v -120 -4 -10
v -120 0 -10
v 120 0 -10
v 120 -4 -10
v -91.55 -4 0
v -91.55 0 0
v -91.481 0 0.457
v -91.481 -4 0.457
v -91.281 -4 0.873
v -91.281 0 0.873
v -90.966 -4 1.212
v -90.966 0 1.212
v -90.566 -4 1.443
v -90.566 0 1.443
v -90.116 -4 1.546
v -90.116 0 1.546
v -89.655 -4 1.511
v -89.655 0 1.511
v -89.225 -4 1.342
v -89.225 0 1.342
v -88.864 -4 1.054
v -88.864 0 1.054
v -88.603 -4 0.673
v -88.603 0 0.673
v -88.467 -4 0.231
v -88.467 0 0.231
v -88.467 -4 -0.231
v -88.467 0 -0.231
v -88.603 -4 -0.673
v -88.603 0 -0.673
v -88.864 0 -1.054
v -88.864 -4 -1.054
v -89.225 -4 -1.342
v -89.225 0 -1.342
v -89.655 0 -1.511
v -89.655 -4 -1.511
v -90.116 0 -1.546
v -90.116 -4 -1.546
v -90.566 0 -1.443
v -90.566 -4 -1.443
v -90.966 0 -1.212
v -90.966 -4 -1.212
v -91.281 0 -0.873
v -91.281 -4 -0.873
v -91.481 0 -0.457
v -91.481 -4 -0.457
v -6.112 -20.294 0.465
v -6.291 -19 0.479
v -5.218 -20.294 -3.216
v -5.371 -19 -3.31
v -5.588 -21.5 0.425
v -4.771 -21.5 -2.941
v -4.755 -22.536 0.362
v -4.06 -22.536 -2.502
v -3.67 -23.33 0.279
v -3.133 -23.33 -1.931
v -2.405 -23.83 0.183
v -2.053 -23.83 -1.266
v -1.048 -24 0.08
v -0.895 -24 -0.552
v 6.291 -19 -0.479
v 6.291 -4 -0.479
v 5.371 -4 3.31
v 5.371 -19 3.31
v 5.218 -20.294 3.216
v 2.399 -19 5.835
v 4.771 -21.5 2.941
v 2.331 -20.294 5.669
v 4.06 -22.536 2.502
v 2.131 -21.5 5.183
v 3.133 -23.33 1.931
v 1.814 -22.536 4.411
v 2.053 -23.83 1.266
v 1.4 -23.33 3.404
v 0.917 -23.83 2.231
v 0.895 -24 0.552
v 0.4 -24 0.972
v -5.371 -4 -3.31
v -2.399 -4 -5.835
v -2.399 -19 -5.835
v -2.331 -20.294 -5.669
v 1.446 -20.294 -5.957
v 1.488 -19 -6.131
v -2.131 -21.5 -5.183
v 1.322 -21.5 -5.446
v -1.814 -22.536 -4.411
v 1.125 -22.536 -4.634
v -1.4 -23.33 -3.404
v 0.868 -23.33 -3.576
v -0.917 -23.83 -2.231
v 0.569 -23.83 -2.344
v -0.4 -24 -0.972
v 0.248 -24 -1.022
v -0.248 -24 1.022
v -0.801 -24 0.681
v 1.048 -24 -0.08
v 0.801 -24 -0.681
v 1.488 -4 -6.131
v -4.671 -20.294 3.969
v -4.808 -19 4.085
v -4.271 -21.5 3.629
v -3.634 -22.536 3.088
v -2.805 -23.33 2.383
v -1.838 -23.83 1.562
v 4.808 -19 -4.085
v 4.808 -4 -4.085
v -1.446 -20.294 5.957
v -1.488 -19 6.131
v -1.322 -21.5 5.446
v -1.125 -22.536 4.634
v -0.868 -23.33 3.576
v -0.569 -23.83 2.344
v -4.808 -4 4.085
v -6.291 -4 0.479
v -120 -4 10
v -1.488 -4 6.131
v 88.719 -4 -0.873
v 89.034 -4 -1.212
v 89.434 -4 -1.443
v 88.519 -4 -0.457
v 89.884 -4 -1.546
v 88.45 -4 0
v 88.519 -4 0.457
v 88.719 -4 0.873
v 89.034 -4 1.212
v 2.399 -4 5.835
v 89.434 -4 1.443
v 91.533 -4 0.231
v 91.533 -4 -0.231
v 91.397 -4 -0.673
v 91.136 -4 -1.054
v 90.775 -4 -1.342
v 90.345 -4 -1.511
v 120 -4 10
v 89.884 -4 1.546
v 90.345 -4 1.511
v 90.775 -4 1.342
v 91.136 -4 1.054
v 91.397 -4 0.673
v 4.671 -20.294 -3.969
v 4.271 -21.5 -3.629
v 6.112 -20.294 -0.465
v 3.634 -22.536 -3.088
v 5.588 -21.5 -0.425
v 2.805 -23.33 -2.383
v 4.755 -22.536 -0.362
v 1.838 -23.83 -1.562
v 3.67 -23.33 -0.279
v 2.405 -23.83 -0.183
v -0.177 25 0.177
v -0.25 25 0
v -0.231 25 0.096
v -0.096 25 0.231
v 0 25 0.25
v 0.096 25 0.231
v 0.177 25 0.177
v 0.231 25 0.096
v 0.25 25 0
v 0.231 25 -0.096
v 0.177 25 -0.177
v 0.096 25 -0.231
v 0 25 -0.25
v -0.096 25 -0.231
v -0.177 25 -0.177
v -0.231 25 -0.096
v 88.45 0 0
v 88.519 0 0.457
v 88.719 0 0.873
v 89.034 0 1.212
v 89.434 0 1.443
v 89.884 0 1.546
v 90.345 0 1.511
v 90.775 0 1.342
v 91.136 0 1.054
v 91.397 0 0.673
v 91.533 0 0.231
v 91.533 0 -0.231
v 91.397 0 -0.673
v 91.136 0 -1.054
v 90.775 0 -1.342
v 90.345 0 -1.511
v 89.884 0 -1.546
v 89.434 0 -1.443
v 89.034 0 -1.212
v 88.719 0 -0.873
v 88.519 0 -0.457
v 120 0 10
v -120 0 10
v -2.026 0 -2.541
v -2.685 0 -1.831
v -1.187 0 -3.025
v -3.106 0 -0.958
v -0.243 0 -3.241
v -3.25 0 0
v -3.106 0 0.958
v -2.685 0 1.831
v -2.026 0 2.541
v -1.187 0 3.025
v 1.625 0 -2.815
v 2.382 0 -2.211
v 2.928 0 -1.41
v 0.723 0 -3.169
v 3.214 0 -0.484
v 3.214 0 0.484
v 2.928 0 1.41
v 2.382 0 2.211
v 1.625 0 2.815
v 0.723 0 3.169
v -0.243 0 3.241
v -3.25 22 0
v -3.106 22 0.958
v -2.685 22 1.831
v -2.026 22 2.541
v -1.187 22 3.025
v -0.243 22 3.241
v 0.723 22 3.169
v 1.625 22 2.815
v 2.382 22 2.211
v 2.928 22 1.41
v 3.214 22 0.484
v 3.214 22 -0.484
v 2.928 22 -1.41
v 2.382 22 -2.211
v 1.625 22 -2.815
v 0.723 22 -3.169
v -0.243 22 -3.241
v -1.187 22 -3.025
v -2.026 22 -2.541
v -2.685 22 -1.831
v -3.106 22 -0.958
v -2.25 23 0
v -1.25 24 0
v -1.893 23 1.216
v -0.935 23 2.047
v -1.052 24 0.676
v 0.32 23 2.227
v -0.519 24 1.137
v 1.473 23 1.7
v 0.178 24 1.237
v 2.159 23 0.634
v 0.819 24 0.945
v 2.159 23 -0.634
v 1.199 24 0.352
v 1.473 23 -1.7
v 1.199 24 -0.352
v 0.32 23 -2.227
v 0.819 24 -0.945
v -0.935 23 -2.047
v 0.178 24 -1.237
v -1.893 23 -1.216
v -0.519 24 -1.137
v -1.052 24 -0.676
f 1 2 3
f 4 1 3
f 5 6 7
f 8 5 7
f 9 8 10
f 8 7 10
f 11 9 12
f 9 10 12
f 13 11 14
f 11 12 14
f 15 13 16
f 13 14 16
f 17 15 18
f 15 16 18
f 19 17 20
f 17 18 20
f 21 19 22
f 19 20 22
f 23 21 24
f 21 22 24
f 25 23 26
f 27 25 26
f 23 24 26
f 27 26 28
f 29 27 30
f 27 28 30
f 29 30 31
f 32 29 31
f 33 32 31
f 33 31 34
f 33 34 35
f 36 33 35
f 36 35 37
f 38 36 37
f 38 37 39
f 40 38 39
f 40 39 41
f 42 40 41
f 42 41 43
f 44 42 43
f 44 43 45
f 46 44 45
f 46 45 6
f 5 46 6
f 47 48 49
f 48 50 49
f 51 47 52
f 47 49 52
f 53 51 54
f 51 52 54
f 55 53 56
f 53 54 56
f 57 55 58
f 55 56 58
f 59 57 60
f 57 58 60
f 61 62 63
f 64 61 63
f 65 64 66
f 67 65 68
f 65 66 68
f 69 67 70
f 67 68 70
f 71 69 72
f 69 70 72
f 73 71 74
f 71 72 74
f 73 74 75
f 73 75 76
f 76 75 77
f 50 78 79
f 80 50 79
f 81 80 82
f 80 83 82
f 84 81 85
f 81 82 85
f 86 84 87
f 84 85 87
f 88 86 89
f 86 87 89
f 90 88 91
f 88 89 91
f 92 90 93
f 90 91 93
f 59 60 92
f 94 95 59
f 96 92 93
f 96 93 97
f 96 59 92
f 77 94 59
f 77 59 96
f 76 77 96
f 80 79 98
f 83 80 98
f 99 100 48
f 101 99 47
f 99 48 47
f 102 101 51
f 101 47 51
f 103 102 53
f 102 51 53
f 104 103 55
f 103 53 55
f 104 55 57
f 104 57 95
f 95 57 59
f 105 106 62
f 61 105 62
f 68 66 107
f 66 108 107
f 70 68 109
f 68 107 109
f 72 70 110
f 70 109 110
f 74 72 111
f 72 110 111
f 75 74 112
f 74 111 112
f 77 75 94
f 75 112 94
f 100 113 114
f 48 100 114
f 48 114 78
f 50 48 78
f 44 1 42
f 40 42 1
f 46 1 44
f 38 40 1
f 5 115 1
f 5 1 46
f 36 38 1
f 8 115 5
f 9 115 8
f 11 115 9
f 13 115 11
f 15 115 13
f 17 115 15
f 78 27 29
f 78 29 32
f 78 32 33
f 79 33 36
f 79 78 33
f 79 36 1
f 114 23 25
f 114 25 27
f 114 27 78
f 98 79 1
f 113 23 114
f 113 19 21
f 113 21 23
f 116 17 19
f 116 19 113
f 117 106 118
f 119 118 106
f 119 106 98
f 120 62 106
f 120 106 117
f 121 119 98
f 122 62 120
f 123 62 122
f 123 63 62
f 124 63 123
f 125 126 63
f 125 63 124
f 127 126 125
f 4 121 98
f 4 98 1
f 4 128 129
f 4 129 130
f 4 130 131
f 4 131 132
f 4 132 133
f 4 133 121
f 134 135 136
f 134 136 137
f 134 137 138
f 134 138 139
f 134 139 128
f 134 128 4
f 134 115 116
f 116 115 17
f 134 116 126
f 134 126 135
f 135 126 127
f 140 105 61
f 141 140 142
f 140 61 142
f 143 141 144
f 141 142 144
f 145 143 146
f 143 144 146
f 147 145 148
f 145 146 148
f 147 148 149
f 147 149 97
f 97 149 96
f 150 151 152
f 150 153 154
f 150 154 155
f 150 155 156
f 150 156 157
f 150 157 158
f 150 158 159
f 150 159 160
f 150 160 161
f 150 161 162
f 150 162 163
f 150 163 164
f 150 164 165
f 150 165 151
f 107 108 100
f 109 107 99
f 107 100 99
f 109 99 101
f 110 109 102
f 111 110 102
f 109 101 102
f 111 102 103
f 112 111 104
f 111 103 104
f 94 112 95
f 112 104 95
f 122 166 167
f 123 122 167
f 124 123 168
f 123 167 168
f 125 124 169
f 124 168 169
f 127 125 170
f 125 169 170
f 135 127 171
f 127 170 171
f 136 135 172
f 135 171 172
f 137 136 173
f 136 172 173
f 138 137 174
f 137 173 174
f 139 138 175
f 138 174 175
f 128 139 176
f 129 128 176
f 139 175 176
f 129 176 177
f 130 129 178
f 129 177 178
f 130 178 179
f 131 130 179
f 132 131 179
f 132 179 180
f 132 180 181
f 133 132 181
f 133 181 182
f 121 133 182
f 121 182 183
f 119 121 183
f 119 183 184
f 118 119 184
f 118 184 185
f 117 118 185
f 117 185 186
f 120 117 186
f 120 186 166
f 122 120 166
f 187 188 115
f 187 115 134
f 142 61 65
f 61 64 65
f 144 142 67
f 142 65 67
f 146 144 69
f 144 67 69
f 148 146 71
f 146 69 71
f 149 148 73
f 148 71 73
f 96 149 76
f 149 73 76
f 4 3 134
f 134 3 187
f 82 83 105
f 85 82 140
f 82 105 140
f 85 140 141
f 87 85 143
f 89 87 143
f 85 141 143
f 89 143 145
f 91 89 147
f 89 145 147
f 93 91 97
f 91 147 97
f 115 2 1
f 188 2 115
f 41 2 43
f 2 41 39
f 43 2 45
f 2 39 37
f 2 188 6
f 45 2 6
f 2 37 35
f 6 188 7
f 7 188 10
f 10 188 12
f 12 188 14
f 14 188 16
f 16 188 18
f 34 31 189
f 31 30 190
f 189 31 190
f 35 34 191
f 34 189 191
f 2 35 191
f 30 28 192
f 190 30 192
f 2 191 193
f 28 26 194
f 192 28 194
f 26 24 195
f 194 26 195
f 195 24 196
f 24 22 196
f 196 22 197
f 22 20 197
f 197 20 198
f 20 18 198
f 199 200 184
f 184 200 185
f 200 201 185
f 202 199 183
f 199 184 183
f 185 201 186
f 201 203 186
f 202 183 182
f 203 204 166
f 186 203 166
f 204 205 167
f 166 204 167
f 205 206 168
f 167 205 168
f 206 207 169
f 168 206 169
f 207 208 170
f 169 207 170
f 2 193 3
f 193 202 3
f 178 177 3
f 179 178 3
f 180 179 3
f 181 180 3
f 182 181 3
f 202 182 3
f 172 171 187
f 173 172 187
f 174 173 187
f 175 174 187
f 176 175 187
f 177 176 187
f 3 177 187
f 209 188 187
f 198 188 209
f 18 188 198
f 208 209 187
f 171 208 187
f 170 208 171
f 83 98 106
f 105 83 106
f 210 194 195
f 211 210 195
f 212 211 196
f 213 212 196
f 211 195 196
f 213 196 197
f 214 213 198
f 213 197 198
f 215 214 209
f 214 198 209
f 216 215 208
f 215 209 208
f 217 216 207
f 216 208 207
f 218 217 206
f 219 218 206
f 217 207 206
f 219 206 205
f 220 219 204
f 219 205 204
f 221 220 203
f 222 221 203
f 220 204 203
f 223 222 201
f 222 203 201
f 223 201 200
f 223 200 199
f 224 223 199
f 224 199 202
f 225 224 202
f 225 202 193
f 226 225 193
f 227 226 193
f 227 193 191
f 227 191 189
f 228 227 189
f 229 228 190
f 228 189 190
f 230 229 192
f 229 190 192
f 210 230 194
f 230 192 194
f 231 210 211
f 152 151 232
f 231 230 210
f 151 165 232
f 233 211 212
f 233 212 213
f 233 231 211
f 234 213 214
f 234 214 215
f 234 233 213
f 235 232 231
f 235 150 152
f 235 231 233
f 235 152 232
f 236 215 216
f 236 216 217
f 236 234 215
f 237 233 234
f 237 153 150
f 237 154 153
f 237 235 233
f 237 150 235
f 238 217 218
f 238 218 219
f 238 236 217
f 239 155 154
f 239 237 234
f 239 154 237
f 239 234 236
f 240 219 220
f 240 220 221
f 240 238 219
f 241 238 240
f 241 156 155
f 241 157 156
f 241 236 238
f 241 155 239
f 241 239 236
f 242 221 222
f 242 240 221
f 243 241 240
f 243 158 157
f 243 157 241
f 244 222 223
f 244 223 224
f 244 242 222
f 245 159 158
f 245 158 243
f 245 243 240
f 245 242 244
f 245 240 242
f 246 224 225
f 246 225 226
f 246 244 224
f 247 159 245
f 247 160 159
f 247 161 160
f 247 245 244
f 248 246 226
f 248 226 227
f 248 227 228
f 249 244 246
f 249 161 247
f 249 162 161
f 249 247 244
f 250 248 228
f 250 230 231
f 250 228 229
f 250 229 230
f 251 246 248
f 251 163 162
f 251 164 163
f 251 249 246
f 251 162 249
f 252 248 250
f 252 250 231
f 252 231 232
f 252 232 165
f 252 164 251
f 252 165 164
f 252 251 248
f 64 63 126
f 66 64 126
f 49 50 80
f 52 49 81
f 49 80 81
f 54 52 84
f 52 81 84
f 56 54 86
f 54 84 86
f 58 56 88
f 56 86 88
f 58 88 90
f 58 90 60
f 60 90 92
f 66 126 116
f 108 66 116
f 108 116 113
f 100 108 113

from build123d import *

# Parameters (mm, degrees)
F0_W     = 240
F0_H     = 20
F1_DEPTH = 4
F3_DEPTH = 20
F4_R     = 5
F5_R     = 3.25
F6_DEPTH = 25
F7_SIZE  = 3
F8_R     = 1.55
F9_DEPTH = 25


with BuildPart() as f1:
    # F0 (on Front) → F1 (new body)
    with BuildSketch(Plane.XZ):
        Rectangle(F0_W, F0_H)
    extrude(amount=F1_DEPTH)

    # F2 (on face) → F3 (join)
    with BuildSketch(Plane.XZ.offset(4)):
        Polygon((5.370641, 3.310112), (2.399305, 5.83472), (-1.488484, 6.130664), (-4.807723, 4.084902), (-6.290574, 0.478847), (-5.370641, -3.310112), (-2.399305, -5.83472), (1.488484, -6.130664), (4.807723, -4.084902), (6.290574, -0.478847), align=None)
    extrude(amount=F3_DEPTH)

    # F4
    f4_edges = [f1.edges().sort_by_distance(p)[0] for p in [
        (5.549149, -24, -2.281874),
        (5.830608, -24, 1.415633),
        (3.884973, -24, 4.572416),
        (0.45541, -24, 5.982692),
        (-3.148103, -24, 5.107783),
        (-5.549149, -24, 2.281874),
        (-5.830608, -24, -1.415633),
        (-3.884973, -24, -4.572416),
        (-0.45541, -24, -5.982692),
        (3.148103, -24, -5.107783),
    ]]
    fillet(f4_edges, radius=F4_R)

    # F5 (on face) → F6 (join)
    with BuildSketch(Plane(origin=(0, 0, 0), x_dir=(-1, 0, 0), z_dir=(0, 1, 0))):
        Circle(F5_R)
    extrude(amount=F6_DEPTH)

    # F7
    f7_edges = [f1.edges().sort_by_distance(p)[0] for p in [
        (3.25, 25, 0),
    ]]
    chamfer(f7_edges, length=F7_SIZE)

    # F8 (on face) → F9 (cut)
    with BuildSketch(Plane(origin=(0, 0, 0), x_dir=(-1, 0, 0), z_dir=(0, 1, 0))):
        with Locations((-90, 0)):
            Circle(F8_R)
        with Locations((90, 0)):
            Circle(F8_R)
    extrude(amount=-F9_DEPTH, mode=Mode.SUBTRACT)


solid = f1.part
